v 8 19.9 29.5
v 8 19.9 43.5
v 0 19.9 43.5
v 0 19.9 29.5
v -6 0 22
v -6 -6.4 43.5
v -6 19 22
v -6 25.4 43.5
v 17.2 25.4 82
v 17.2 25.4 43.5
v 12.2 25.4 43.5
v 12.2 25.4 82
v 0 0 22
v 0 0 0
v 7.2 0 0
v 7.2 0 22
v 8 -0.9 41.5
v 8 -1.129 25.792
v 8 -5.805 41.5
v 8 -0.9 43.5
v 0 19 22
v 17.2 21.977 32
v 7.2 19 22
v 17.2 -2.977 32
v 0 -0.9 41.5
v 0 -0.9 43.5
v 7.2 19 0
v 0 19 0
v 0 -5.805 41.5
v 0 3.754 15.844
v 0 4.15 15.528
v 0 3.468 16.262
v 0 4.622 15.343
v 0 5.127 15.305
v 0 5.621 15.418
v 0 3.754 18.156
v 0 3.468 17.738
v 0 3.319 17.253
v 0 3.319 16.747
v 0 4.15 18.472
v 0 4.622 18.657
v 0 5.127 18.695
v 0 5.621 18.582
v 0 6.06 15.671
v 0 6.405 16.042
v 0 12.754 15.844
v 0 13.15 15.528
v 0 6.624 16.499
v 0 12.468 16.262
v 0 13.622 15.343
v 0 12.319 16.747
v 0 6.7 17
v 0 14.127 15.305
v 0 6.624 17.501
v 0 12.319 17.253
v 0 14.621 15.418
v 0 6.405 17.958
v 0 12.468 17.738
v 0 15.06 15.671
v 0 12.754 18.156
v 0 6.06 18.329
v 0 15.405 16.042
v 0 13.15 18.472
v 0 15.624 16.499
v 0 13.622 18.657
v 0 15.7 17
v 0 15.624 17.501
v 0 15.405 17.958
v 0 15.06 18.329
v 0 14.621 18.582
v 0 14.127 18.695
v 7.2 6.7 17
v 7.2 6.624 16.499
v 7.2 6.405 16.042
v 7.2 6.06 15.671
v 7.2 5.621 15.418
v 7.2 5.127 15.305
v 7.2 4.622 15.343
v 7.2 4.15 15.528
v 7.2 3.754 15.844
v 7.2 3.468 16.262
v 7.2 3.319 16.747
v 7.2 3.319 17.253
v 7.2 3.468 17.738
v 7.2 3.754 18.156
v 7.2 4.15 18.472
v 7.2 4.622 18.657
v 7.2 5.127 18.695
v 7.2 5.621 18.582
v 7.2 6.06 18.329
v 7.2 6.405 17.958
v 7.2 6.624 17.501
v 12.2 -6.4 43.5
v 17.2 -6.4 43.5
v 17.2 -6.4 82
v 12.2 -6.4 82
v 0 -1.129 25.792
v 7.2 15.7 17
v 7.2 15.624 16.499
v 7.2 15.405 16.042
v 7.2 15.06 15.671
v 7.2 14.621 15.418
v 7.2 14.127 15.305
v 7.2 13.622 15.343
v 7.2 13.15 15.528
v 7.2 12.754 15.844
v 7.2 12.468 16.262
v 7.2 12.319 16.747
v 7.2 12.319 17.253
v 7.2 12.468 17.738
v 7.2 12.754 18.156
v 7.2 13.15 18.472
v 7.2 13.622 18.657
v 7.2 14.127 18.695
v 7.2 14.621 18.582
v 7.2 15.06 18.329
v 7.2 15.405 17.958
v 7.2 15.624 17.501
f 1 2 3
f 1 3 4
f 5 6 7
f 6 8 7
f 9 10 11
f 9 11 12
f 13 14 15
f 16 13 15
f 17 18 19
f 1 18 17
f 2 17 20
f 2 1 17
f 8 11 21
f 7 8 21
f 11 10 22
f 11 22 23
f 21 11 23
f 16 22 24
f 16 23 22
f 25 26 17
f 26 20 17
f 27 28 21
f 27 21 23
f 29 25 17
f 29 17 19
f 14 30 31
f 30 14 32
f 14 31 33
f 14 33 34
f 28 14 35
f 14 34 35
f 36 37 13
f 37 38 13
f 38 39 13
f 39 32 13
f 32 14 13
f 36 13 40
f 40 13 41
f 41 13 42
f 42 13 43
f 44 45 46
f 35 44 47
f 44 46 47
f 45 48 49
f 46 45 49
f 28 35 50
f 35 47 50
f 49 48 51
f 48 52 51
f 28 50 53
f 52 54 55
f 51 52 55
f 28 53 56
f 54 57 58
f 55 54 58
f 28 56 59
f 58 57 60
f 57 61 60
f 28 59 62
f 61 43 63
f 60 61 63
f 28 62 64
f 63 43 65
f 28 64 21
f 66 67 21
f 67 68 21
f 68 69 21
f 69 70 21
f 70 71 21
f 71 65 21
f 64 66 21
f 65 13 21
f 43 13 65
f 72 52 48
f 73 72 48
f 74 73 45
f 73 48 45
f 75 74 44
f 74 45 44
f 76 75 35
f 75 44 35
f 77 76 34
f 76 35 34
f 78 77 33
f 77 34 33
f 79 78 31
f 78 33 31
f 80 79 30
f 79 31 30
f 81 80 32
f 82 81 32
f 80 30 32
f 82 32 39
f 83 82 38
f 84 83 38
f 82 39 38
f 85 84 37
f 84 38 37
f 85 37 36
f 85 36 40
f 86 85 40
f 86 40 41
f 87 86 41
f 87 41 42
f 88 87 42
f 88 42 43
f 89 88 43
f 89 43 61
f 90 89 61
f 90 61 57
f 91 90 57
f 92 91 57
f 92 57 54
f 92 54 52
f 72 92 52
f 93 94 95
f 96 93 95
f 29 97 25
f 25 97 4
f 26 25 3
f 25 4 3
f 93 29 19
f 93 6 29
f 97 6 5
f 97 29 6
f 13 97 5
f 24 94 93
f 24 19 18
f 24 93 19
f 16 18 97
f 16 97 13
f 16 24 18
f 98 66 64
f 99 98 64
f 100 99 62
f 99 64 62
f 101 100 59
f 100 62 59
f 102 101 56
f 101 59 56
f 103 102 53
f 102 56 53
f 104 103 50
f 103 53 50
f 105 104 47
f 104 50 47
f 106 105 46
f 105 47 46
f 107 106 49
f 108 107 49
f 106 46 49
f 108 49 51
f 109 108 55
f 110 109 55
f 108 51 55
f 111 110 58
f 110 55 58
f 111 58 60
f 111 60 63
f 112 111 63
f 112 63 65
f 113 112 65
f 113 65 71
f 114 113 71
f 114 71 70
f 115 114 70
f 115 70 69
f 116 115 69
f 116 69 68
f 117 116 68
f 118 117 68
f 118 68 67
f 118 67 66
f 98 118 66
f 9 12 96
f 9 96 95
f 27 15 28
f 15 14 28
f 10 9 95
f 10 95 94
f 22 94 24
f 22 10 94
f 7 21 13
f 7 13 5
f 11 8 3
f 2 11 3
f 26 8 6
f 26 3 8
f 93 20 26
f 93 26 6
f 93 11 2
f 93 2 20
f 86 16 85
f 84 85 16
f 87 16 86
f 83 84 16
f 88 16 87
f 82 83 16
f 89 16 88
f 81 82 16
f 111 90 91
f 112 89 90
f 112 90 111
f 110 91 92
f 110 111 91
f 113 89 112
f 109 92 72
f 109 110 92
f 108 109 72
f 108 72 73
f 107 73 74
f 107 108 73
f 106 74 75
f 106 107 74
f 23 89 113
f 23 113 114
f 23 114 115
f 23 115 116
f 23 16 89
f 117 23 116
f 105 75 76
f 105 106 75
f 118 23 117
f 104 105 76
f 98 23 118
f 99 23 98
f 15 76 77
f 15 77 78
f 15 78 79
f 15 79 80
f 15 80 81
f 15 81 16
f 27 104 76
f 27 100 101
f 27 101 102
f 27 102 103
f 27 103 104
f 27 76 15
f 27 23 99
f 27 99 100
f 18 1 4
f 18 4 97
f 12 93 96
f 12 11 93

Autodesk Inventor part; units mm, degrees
ref_plane "YZ Plane" through (0, 0, 0) normal (1, 0, 0) x (0, 1, 0)
ref_plane "XZ Plane" through (0, 0, 0) normal (0, 1, 0) x (-1, 0, 0)
ref_plane "XY Plane" through (0, 0, 0) normal (0, 0, 1) x (1, 0, 0)
sketch "Sketch1" plane through (0, 0, 0) normal (1, 0, 0) x (0, 1, 0)
  line L0 (0, 0) -> (19, 0)
  line L1 (19, 0) -> (19, 22)
  line L2 (19, 22) -> (0, 22)
  line L3 (0, 22) -> (0, 0)
  line L4 (19, 22) -> (14, 22)
  line L5 (14, 22) -> (14, 17)
  line L6 (14, 17) -> (19, 17)
  line L7 (19, 17) -> (19, 22)
  line L8 (0, 22) -> (5, 22)
  line L9 (5, 22) -> (5, 17)
  line L10 (5, 17) -> (0, 17)
  line L11 (0, 17) -> (0, 22)
  circle A0 centre (14, 17) radius 1.7
  circle A1 centre (5, 17) radius 1.7
  dimension "d0" = 19
  dimension "d1" = 22
  dimension "d2" = 5
  dimension "d3" = 5
  dimension "d4" = 5
  dimension "d5" = 5
  dimension "d6" = 3.4
  dimension "d7" = 3.4
extrude "Extrusion1" add sketch "Sketch1" along normal blind 17.2 contours L3 L10 A1 L9 L2 L5 A0 L6 L1 L0 | L3 L2 L9 A1 L10 | L6 A0 L5 L2 L1
sketch "Sketch2" plane through (0, 19, 22) normal (0, 1, 0) x (1, 0, 0)
  line L0 (0, 0) -> (17.2, 0) projected
  line L1 (17.2, 0) -> (-6, 0)
  line L2 (-6, 0) -> (-6, -60)
  line L3 (-6, -60) -> (17.2, -60)
  line L4 (17.2, -60) -> (17.2, 0)
  point P0 (0, 22)
  dimension "d10" = 23.2
  dimension "d11" = 60
extrude "Extrusion2" add sketch "Sketch2" against normal blind 19
sketch "Sketch3" plane through (-6, 19, 22) normal (-1, 0, 0) x (0, 0, 1)
  line L0 (-22, 0) -> (60, 0) projected
  line L1 (-22, -19) -> (60, -19) projected
  line L2 (60, 0) -> (21.5, 0)
  line L3 (21.5, 0) -> (21.5, -19)
  line L4 (21.5, -19) -> (60, -19)
  line L5 (60, -19) -> (60, 0)
  point P0 (-10, 0)
  point P1 (-10, -19)
  dimension "d23" = 38.5
extrude "Extrusion3" cut sketch "Sketch3" against normal blind 18.2
sketch "Sketch4" plane through (17.2, 0, 0) normal (1, 0, 0) x (0, 0, -1)
  line L0 (0, 0) -> (0, 19) projected
  line L1 (0, 19) -> (-82, 19) projected
  line L2 (0, 0) -> (-22, 0)
  line L3 (-22, 0) -> (-22, 19)
  line L4 (-22, 19) -> (0, 19)
  line L5 (0, 19) -> (0, 0)
  dimension "d26" = 22
extrude "Extrusion4" cut sketch "Sketch4" against normal blind 10
sketch "Sketch5" plane through (17.2, 0, 0) normal (1, 0, 0) x (0, 0, -1)
  line L0 (-22, 0) -> (-22, 19) projected
  line L1 (-22, 9.5) -> (-22, 25.4)
  line L2 (-43.5, 0) -> (-43.5, 19) projected
  line L3 (-22, 25.4) -> (-43.5, 25.4)
  line L4 (-43.5, 25.4) -> (-43.5, 19)
  line L5 (-43.5, 19) -> (-22, 19)
  line L6 (-22, 19) -> (-22, 25.4)
  line L7 (0, 19) -> (-22, 19) projected
  line L8 (-43.5, 25.4) -> (-22, 19)
  line L9 (-22, 9.5) -> (-27.2776, 9.5)
  line L10 (-22, 19) -> (-22, 0)
  line L11 (-22, 9.5) -> (-22, -6.4)
  line L12 (-43.5, 19) -> (-43.5, 0)
  line L13 (-22, -6.4) -> (-43.5, -6.4)
  line L14 (-43.5, -6.4) -> (-43.5, 0)
  line L15 (-43.5, 0) -> (-22, 0)
  line L16 (-22, 0) -> (-22, -6.4)
  line L17 (0, 0) -> (-22, 0)
  line L18 (-43.5, -6.4) -> (-22, 0)
  point P0 (0, 0)
  dimension "d29" = 15.9
extrude "Extrusion5" add sketch "Sketch5" against normal blind 23.2 contours L18 L14 L15 | L5 L4 L8
sketch "Sketch6" plane through (17.2, 0, 0) normal (1, 0, 0) x (0, 0, -1)
  line L0 (-82, 19) -> (-82, 0) projected
  line L1 (-43.5, -6.4) -> (-43.5, 25.4) projected
  line L2 (-82, 0) -> (-43.5, 0)
  line L3 (-43.5, 0) -> (-43.5, -6.4)
  line L4 (-43.5, -6.4) -> (-82, -6.4)
  line L5 (-82, -6.4) -> (-82, 0)
  line L6 (-43.5, 19) -> (-82, 19) projected
  line L7 (-43.5, 25.4) -> (-22, 19) projected
  line L8 (-82, 19) -> (-43.5, 19)
  line L9 (-43.5, 19) -> (-43.5, 25.4)
  line L10 (-43.5, 25.4) -> (-82, 25.4)
  line L11 (-82, 25.4) -> (-82, 19)
  point P0 (0, 0)
extrude "Extrusion6" add sketch "Sketch6" against normal blind 5 contours L11 L10 L1 L6 | L2 L1 L4 L5
chamfer "Chamfer4" distance 10 angle 45 1 edges at (17.2, 9.5, 22)
ref_plane "Work Plane1" through (8, -6.4, 43.5) normal (-1, 0, 0) x (0, 0, 1)
sketch "Sketch11" plane through (8, -6.4, 43.5) normal (-1, 0, 0) x (0, 0, 1)
  line L0 (38.5, 31.8) -> (0, 31.8) projected
  line L1 (38.5, 0) -> (0, 0) projected
  line L2 (0, 31.8) -> (0, 0)
  line L3 (0, 0) -> (0, 31.8) projected
  line L4 (0, 15.9) -> (0, 5.5)
  line L5 (0, 5.5) -> (0, 26.3)
  line L6 (0, 26.3) -> (-14, 26.3)
  line L7 (-14, 26.3) -> (-19.2094, -3.2442)
  line L8 (0, 5.5) -> (-2, 5.5)
  line L9 (-2, 5.5) -> (-2, -4.5)
  line L10 (-19.2094, -3.2442) -> (-2, -4.5)
  point P0 (-43.5, 6.4)
  dimension "d61" = 10.4
  dimension "d62" = 20.8
  dimension "d63" = 14
  dimension "d64" = 30
  dimension "d65" = 100
  dimension "d66" = 2
  dimension "d67" = 10
  dimension "d68" = 90
extrude "Extrusion10" cut sketch "Sketch11" along normal blind 8
sketch "Sketch12" plane through (12.2, 19, 22) normal (-1, 0, 0) x (0, 0, 1)
  point P0 (-22, -19)
properties part number "Finger"
